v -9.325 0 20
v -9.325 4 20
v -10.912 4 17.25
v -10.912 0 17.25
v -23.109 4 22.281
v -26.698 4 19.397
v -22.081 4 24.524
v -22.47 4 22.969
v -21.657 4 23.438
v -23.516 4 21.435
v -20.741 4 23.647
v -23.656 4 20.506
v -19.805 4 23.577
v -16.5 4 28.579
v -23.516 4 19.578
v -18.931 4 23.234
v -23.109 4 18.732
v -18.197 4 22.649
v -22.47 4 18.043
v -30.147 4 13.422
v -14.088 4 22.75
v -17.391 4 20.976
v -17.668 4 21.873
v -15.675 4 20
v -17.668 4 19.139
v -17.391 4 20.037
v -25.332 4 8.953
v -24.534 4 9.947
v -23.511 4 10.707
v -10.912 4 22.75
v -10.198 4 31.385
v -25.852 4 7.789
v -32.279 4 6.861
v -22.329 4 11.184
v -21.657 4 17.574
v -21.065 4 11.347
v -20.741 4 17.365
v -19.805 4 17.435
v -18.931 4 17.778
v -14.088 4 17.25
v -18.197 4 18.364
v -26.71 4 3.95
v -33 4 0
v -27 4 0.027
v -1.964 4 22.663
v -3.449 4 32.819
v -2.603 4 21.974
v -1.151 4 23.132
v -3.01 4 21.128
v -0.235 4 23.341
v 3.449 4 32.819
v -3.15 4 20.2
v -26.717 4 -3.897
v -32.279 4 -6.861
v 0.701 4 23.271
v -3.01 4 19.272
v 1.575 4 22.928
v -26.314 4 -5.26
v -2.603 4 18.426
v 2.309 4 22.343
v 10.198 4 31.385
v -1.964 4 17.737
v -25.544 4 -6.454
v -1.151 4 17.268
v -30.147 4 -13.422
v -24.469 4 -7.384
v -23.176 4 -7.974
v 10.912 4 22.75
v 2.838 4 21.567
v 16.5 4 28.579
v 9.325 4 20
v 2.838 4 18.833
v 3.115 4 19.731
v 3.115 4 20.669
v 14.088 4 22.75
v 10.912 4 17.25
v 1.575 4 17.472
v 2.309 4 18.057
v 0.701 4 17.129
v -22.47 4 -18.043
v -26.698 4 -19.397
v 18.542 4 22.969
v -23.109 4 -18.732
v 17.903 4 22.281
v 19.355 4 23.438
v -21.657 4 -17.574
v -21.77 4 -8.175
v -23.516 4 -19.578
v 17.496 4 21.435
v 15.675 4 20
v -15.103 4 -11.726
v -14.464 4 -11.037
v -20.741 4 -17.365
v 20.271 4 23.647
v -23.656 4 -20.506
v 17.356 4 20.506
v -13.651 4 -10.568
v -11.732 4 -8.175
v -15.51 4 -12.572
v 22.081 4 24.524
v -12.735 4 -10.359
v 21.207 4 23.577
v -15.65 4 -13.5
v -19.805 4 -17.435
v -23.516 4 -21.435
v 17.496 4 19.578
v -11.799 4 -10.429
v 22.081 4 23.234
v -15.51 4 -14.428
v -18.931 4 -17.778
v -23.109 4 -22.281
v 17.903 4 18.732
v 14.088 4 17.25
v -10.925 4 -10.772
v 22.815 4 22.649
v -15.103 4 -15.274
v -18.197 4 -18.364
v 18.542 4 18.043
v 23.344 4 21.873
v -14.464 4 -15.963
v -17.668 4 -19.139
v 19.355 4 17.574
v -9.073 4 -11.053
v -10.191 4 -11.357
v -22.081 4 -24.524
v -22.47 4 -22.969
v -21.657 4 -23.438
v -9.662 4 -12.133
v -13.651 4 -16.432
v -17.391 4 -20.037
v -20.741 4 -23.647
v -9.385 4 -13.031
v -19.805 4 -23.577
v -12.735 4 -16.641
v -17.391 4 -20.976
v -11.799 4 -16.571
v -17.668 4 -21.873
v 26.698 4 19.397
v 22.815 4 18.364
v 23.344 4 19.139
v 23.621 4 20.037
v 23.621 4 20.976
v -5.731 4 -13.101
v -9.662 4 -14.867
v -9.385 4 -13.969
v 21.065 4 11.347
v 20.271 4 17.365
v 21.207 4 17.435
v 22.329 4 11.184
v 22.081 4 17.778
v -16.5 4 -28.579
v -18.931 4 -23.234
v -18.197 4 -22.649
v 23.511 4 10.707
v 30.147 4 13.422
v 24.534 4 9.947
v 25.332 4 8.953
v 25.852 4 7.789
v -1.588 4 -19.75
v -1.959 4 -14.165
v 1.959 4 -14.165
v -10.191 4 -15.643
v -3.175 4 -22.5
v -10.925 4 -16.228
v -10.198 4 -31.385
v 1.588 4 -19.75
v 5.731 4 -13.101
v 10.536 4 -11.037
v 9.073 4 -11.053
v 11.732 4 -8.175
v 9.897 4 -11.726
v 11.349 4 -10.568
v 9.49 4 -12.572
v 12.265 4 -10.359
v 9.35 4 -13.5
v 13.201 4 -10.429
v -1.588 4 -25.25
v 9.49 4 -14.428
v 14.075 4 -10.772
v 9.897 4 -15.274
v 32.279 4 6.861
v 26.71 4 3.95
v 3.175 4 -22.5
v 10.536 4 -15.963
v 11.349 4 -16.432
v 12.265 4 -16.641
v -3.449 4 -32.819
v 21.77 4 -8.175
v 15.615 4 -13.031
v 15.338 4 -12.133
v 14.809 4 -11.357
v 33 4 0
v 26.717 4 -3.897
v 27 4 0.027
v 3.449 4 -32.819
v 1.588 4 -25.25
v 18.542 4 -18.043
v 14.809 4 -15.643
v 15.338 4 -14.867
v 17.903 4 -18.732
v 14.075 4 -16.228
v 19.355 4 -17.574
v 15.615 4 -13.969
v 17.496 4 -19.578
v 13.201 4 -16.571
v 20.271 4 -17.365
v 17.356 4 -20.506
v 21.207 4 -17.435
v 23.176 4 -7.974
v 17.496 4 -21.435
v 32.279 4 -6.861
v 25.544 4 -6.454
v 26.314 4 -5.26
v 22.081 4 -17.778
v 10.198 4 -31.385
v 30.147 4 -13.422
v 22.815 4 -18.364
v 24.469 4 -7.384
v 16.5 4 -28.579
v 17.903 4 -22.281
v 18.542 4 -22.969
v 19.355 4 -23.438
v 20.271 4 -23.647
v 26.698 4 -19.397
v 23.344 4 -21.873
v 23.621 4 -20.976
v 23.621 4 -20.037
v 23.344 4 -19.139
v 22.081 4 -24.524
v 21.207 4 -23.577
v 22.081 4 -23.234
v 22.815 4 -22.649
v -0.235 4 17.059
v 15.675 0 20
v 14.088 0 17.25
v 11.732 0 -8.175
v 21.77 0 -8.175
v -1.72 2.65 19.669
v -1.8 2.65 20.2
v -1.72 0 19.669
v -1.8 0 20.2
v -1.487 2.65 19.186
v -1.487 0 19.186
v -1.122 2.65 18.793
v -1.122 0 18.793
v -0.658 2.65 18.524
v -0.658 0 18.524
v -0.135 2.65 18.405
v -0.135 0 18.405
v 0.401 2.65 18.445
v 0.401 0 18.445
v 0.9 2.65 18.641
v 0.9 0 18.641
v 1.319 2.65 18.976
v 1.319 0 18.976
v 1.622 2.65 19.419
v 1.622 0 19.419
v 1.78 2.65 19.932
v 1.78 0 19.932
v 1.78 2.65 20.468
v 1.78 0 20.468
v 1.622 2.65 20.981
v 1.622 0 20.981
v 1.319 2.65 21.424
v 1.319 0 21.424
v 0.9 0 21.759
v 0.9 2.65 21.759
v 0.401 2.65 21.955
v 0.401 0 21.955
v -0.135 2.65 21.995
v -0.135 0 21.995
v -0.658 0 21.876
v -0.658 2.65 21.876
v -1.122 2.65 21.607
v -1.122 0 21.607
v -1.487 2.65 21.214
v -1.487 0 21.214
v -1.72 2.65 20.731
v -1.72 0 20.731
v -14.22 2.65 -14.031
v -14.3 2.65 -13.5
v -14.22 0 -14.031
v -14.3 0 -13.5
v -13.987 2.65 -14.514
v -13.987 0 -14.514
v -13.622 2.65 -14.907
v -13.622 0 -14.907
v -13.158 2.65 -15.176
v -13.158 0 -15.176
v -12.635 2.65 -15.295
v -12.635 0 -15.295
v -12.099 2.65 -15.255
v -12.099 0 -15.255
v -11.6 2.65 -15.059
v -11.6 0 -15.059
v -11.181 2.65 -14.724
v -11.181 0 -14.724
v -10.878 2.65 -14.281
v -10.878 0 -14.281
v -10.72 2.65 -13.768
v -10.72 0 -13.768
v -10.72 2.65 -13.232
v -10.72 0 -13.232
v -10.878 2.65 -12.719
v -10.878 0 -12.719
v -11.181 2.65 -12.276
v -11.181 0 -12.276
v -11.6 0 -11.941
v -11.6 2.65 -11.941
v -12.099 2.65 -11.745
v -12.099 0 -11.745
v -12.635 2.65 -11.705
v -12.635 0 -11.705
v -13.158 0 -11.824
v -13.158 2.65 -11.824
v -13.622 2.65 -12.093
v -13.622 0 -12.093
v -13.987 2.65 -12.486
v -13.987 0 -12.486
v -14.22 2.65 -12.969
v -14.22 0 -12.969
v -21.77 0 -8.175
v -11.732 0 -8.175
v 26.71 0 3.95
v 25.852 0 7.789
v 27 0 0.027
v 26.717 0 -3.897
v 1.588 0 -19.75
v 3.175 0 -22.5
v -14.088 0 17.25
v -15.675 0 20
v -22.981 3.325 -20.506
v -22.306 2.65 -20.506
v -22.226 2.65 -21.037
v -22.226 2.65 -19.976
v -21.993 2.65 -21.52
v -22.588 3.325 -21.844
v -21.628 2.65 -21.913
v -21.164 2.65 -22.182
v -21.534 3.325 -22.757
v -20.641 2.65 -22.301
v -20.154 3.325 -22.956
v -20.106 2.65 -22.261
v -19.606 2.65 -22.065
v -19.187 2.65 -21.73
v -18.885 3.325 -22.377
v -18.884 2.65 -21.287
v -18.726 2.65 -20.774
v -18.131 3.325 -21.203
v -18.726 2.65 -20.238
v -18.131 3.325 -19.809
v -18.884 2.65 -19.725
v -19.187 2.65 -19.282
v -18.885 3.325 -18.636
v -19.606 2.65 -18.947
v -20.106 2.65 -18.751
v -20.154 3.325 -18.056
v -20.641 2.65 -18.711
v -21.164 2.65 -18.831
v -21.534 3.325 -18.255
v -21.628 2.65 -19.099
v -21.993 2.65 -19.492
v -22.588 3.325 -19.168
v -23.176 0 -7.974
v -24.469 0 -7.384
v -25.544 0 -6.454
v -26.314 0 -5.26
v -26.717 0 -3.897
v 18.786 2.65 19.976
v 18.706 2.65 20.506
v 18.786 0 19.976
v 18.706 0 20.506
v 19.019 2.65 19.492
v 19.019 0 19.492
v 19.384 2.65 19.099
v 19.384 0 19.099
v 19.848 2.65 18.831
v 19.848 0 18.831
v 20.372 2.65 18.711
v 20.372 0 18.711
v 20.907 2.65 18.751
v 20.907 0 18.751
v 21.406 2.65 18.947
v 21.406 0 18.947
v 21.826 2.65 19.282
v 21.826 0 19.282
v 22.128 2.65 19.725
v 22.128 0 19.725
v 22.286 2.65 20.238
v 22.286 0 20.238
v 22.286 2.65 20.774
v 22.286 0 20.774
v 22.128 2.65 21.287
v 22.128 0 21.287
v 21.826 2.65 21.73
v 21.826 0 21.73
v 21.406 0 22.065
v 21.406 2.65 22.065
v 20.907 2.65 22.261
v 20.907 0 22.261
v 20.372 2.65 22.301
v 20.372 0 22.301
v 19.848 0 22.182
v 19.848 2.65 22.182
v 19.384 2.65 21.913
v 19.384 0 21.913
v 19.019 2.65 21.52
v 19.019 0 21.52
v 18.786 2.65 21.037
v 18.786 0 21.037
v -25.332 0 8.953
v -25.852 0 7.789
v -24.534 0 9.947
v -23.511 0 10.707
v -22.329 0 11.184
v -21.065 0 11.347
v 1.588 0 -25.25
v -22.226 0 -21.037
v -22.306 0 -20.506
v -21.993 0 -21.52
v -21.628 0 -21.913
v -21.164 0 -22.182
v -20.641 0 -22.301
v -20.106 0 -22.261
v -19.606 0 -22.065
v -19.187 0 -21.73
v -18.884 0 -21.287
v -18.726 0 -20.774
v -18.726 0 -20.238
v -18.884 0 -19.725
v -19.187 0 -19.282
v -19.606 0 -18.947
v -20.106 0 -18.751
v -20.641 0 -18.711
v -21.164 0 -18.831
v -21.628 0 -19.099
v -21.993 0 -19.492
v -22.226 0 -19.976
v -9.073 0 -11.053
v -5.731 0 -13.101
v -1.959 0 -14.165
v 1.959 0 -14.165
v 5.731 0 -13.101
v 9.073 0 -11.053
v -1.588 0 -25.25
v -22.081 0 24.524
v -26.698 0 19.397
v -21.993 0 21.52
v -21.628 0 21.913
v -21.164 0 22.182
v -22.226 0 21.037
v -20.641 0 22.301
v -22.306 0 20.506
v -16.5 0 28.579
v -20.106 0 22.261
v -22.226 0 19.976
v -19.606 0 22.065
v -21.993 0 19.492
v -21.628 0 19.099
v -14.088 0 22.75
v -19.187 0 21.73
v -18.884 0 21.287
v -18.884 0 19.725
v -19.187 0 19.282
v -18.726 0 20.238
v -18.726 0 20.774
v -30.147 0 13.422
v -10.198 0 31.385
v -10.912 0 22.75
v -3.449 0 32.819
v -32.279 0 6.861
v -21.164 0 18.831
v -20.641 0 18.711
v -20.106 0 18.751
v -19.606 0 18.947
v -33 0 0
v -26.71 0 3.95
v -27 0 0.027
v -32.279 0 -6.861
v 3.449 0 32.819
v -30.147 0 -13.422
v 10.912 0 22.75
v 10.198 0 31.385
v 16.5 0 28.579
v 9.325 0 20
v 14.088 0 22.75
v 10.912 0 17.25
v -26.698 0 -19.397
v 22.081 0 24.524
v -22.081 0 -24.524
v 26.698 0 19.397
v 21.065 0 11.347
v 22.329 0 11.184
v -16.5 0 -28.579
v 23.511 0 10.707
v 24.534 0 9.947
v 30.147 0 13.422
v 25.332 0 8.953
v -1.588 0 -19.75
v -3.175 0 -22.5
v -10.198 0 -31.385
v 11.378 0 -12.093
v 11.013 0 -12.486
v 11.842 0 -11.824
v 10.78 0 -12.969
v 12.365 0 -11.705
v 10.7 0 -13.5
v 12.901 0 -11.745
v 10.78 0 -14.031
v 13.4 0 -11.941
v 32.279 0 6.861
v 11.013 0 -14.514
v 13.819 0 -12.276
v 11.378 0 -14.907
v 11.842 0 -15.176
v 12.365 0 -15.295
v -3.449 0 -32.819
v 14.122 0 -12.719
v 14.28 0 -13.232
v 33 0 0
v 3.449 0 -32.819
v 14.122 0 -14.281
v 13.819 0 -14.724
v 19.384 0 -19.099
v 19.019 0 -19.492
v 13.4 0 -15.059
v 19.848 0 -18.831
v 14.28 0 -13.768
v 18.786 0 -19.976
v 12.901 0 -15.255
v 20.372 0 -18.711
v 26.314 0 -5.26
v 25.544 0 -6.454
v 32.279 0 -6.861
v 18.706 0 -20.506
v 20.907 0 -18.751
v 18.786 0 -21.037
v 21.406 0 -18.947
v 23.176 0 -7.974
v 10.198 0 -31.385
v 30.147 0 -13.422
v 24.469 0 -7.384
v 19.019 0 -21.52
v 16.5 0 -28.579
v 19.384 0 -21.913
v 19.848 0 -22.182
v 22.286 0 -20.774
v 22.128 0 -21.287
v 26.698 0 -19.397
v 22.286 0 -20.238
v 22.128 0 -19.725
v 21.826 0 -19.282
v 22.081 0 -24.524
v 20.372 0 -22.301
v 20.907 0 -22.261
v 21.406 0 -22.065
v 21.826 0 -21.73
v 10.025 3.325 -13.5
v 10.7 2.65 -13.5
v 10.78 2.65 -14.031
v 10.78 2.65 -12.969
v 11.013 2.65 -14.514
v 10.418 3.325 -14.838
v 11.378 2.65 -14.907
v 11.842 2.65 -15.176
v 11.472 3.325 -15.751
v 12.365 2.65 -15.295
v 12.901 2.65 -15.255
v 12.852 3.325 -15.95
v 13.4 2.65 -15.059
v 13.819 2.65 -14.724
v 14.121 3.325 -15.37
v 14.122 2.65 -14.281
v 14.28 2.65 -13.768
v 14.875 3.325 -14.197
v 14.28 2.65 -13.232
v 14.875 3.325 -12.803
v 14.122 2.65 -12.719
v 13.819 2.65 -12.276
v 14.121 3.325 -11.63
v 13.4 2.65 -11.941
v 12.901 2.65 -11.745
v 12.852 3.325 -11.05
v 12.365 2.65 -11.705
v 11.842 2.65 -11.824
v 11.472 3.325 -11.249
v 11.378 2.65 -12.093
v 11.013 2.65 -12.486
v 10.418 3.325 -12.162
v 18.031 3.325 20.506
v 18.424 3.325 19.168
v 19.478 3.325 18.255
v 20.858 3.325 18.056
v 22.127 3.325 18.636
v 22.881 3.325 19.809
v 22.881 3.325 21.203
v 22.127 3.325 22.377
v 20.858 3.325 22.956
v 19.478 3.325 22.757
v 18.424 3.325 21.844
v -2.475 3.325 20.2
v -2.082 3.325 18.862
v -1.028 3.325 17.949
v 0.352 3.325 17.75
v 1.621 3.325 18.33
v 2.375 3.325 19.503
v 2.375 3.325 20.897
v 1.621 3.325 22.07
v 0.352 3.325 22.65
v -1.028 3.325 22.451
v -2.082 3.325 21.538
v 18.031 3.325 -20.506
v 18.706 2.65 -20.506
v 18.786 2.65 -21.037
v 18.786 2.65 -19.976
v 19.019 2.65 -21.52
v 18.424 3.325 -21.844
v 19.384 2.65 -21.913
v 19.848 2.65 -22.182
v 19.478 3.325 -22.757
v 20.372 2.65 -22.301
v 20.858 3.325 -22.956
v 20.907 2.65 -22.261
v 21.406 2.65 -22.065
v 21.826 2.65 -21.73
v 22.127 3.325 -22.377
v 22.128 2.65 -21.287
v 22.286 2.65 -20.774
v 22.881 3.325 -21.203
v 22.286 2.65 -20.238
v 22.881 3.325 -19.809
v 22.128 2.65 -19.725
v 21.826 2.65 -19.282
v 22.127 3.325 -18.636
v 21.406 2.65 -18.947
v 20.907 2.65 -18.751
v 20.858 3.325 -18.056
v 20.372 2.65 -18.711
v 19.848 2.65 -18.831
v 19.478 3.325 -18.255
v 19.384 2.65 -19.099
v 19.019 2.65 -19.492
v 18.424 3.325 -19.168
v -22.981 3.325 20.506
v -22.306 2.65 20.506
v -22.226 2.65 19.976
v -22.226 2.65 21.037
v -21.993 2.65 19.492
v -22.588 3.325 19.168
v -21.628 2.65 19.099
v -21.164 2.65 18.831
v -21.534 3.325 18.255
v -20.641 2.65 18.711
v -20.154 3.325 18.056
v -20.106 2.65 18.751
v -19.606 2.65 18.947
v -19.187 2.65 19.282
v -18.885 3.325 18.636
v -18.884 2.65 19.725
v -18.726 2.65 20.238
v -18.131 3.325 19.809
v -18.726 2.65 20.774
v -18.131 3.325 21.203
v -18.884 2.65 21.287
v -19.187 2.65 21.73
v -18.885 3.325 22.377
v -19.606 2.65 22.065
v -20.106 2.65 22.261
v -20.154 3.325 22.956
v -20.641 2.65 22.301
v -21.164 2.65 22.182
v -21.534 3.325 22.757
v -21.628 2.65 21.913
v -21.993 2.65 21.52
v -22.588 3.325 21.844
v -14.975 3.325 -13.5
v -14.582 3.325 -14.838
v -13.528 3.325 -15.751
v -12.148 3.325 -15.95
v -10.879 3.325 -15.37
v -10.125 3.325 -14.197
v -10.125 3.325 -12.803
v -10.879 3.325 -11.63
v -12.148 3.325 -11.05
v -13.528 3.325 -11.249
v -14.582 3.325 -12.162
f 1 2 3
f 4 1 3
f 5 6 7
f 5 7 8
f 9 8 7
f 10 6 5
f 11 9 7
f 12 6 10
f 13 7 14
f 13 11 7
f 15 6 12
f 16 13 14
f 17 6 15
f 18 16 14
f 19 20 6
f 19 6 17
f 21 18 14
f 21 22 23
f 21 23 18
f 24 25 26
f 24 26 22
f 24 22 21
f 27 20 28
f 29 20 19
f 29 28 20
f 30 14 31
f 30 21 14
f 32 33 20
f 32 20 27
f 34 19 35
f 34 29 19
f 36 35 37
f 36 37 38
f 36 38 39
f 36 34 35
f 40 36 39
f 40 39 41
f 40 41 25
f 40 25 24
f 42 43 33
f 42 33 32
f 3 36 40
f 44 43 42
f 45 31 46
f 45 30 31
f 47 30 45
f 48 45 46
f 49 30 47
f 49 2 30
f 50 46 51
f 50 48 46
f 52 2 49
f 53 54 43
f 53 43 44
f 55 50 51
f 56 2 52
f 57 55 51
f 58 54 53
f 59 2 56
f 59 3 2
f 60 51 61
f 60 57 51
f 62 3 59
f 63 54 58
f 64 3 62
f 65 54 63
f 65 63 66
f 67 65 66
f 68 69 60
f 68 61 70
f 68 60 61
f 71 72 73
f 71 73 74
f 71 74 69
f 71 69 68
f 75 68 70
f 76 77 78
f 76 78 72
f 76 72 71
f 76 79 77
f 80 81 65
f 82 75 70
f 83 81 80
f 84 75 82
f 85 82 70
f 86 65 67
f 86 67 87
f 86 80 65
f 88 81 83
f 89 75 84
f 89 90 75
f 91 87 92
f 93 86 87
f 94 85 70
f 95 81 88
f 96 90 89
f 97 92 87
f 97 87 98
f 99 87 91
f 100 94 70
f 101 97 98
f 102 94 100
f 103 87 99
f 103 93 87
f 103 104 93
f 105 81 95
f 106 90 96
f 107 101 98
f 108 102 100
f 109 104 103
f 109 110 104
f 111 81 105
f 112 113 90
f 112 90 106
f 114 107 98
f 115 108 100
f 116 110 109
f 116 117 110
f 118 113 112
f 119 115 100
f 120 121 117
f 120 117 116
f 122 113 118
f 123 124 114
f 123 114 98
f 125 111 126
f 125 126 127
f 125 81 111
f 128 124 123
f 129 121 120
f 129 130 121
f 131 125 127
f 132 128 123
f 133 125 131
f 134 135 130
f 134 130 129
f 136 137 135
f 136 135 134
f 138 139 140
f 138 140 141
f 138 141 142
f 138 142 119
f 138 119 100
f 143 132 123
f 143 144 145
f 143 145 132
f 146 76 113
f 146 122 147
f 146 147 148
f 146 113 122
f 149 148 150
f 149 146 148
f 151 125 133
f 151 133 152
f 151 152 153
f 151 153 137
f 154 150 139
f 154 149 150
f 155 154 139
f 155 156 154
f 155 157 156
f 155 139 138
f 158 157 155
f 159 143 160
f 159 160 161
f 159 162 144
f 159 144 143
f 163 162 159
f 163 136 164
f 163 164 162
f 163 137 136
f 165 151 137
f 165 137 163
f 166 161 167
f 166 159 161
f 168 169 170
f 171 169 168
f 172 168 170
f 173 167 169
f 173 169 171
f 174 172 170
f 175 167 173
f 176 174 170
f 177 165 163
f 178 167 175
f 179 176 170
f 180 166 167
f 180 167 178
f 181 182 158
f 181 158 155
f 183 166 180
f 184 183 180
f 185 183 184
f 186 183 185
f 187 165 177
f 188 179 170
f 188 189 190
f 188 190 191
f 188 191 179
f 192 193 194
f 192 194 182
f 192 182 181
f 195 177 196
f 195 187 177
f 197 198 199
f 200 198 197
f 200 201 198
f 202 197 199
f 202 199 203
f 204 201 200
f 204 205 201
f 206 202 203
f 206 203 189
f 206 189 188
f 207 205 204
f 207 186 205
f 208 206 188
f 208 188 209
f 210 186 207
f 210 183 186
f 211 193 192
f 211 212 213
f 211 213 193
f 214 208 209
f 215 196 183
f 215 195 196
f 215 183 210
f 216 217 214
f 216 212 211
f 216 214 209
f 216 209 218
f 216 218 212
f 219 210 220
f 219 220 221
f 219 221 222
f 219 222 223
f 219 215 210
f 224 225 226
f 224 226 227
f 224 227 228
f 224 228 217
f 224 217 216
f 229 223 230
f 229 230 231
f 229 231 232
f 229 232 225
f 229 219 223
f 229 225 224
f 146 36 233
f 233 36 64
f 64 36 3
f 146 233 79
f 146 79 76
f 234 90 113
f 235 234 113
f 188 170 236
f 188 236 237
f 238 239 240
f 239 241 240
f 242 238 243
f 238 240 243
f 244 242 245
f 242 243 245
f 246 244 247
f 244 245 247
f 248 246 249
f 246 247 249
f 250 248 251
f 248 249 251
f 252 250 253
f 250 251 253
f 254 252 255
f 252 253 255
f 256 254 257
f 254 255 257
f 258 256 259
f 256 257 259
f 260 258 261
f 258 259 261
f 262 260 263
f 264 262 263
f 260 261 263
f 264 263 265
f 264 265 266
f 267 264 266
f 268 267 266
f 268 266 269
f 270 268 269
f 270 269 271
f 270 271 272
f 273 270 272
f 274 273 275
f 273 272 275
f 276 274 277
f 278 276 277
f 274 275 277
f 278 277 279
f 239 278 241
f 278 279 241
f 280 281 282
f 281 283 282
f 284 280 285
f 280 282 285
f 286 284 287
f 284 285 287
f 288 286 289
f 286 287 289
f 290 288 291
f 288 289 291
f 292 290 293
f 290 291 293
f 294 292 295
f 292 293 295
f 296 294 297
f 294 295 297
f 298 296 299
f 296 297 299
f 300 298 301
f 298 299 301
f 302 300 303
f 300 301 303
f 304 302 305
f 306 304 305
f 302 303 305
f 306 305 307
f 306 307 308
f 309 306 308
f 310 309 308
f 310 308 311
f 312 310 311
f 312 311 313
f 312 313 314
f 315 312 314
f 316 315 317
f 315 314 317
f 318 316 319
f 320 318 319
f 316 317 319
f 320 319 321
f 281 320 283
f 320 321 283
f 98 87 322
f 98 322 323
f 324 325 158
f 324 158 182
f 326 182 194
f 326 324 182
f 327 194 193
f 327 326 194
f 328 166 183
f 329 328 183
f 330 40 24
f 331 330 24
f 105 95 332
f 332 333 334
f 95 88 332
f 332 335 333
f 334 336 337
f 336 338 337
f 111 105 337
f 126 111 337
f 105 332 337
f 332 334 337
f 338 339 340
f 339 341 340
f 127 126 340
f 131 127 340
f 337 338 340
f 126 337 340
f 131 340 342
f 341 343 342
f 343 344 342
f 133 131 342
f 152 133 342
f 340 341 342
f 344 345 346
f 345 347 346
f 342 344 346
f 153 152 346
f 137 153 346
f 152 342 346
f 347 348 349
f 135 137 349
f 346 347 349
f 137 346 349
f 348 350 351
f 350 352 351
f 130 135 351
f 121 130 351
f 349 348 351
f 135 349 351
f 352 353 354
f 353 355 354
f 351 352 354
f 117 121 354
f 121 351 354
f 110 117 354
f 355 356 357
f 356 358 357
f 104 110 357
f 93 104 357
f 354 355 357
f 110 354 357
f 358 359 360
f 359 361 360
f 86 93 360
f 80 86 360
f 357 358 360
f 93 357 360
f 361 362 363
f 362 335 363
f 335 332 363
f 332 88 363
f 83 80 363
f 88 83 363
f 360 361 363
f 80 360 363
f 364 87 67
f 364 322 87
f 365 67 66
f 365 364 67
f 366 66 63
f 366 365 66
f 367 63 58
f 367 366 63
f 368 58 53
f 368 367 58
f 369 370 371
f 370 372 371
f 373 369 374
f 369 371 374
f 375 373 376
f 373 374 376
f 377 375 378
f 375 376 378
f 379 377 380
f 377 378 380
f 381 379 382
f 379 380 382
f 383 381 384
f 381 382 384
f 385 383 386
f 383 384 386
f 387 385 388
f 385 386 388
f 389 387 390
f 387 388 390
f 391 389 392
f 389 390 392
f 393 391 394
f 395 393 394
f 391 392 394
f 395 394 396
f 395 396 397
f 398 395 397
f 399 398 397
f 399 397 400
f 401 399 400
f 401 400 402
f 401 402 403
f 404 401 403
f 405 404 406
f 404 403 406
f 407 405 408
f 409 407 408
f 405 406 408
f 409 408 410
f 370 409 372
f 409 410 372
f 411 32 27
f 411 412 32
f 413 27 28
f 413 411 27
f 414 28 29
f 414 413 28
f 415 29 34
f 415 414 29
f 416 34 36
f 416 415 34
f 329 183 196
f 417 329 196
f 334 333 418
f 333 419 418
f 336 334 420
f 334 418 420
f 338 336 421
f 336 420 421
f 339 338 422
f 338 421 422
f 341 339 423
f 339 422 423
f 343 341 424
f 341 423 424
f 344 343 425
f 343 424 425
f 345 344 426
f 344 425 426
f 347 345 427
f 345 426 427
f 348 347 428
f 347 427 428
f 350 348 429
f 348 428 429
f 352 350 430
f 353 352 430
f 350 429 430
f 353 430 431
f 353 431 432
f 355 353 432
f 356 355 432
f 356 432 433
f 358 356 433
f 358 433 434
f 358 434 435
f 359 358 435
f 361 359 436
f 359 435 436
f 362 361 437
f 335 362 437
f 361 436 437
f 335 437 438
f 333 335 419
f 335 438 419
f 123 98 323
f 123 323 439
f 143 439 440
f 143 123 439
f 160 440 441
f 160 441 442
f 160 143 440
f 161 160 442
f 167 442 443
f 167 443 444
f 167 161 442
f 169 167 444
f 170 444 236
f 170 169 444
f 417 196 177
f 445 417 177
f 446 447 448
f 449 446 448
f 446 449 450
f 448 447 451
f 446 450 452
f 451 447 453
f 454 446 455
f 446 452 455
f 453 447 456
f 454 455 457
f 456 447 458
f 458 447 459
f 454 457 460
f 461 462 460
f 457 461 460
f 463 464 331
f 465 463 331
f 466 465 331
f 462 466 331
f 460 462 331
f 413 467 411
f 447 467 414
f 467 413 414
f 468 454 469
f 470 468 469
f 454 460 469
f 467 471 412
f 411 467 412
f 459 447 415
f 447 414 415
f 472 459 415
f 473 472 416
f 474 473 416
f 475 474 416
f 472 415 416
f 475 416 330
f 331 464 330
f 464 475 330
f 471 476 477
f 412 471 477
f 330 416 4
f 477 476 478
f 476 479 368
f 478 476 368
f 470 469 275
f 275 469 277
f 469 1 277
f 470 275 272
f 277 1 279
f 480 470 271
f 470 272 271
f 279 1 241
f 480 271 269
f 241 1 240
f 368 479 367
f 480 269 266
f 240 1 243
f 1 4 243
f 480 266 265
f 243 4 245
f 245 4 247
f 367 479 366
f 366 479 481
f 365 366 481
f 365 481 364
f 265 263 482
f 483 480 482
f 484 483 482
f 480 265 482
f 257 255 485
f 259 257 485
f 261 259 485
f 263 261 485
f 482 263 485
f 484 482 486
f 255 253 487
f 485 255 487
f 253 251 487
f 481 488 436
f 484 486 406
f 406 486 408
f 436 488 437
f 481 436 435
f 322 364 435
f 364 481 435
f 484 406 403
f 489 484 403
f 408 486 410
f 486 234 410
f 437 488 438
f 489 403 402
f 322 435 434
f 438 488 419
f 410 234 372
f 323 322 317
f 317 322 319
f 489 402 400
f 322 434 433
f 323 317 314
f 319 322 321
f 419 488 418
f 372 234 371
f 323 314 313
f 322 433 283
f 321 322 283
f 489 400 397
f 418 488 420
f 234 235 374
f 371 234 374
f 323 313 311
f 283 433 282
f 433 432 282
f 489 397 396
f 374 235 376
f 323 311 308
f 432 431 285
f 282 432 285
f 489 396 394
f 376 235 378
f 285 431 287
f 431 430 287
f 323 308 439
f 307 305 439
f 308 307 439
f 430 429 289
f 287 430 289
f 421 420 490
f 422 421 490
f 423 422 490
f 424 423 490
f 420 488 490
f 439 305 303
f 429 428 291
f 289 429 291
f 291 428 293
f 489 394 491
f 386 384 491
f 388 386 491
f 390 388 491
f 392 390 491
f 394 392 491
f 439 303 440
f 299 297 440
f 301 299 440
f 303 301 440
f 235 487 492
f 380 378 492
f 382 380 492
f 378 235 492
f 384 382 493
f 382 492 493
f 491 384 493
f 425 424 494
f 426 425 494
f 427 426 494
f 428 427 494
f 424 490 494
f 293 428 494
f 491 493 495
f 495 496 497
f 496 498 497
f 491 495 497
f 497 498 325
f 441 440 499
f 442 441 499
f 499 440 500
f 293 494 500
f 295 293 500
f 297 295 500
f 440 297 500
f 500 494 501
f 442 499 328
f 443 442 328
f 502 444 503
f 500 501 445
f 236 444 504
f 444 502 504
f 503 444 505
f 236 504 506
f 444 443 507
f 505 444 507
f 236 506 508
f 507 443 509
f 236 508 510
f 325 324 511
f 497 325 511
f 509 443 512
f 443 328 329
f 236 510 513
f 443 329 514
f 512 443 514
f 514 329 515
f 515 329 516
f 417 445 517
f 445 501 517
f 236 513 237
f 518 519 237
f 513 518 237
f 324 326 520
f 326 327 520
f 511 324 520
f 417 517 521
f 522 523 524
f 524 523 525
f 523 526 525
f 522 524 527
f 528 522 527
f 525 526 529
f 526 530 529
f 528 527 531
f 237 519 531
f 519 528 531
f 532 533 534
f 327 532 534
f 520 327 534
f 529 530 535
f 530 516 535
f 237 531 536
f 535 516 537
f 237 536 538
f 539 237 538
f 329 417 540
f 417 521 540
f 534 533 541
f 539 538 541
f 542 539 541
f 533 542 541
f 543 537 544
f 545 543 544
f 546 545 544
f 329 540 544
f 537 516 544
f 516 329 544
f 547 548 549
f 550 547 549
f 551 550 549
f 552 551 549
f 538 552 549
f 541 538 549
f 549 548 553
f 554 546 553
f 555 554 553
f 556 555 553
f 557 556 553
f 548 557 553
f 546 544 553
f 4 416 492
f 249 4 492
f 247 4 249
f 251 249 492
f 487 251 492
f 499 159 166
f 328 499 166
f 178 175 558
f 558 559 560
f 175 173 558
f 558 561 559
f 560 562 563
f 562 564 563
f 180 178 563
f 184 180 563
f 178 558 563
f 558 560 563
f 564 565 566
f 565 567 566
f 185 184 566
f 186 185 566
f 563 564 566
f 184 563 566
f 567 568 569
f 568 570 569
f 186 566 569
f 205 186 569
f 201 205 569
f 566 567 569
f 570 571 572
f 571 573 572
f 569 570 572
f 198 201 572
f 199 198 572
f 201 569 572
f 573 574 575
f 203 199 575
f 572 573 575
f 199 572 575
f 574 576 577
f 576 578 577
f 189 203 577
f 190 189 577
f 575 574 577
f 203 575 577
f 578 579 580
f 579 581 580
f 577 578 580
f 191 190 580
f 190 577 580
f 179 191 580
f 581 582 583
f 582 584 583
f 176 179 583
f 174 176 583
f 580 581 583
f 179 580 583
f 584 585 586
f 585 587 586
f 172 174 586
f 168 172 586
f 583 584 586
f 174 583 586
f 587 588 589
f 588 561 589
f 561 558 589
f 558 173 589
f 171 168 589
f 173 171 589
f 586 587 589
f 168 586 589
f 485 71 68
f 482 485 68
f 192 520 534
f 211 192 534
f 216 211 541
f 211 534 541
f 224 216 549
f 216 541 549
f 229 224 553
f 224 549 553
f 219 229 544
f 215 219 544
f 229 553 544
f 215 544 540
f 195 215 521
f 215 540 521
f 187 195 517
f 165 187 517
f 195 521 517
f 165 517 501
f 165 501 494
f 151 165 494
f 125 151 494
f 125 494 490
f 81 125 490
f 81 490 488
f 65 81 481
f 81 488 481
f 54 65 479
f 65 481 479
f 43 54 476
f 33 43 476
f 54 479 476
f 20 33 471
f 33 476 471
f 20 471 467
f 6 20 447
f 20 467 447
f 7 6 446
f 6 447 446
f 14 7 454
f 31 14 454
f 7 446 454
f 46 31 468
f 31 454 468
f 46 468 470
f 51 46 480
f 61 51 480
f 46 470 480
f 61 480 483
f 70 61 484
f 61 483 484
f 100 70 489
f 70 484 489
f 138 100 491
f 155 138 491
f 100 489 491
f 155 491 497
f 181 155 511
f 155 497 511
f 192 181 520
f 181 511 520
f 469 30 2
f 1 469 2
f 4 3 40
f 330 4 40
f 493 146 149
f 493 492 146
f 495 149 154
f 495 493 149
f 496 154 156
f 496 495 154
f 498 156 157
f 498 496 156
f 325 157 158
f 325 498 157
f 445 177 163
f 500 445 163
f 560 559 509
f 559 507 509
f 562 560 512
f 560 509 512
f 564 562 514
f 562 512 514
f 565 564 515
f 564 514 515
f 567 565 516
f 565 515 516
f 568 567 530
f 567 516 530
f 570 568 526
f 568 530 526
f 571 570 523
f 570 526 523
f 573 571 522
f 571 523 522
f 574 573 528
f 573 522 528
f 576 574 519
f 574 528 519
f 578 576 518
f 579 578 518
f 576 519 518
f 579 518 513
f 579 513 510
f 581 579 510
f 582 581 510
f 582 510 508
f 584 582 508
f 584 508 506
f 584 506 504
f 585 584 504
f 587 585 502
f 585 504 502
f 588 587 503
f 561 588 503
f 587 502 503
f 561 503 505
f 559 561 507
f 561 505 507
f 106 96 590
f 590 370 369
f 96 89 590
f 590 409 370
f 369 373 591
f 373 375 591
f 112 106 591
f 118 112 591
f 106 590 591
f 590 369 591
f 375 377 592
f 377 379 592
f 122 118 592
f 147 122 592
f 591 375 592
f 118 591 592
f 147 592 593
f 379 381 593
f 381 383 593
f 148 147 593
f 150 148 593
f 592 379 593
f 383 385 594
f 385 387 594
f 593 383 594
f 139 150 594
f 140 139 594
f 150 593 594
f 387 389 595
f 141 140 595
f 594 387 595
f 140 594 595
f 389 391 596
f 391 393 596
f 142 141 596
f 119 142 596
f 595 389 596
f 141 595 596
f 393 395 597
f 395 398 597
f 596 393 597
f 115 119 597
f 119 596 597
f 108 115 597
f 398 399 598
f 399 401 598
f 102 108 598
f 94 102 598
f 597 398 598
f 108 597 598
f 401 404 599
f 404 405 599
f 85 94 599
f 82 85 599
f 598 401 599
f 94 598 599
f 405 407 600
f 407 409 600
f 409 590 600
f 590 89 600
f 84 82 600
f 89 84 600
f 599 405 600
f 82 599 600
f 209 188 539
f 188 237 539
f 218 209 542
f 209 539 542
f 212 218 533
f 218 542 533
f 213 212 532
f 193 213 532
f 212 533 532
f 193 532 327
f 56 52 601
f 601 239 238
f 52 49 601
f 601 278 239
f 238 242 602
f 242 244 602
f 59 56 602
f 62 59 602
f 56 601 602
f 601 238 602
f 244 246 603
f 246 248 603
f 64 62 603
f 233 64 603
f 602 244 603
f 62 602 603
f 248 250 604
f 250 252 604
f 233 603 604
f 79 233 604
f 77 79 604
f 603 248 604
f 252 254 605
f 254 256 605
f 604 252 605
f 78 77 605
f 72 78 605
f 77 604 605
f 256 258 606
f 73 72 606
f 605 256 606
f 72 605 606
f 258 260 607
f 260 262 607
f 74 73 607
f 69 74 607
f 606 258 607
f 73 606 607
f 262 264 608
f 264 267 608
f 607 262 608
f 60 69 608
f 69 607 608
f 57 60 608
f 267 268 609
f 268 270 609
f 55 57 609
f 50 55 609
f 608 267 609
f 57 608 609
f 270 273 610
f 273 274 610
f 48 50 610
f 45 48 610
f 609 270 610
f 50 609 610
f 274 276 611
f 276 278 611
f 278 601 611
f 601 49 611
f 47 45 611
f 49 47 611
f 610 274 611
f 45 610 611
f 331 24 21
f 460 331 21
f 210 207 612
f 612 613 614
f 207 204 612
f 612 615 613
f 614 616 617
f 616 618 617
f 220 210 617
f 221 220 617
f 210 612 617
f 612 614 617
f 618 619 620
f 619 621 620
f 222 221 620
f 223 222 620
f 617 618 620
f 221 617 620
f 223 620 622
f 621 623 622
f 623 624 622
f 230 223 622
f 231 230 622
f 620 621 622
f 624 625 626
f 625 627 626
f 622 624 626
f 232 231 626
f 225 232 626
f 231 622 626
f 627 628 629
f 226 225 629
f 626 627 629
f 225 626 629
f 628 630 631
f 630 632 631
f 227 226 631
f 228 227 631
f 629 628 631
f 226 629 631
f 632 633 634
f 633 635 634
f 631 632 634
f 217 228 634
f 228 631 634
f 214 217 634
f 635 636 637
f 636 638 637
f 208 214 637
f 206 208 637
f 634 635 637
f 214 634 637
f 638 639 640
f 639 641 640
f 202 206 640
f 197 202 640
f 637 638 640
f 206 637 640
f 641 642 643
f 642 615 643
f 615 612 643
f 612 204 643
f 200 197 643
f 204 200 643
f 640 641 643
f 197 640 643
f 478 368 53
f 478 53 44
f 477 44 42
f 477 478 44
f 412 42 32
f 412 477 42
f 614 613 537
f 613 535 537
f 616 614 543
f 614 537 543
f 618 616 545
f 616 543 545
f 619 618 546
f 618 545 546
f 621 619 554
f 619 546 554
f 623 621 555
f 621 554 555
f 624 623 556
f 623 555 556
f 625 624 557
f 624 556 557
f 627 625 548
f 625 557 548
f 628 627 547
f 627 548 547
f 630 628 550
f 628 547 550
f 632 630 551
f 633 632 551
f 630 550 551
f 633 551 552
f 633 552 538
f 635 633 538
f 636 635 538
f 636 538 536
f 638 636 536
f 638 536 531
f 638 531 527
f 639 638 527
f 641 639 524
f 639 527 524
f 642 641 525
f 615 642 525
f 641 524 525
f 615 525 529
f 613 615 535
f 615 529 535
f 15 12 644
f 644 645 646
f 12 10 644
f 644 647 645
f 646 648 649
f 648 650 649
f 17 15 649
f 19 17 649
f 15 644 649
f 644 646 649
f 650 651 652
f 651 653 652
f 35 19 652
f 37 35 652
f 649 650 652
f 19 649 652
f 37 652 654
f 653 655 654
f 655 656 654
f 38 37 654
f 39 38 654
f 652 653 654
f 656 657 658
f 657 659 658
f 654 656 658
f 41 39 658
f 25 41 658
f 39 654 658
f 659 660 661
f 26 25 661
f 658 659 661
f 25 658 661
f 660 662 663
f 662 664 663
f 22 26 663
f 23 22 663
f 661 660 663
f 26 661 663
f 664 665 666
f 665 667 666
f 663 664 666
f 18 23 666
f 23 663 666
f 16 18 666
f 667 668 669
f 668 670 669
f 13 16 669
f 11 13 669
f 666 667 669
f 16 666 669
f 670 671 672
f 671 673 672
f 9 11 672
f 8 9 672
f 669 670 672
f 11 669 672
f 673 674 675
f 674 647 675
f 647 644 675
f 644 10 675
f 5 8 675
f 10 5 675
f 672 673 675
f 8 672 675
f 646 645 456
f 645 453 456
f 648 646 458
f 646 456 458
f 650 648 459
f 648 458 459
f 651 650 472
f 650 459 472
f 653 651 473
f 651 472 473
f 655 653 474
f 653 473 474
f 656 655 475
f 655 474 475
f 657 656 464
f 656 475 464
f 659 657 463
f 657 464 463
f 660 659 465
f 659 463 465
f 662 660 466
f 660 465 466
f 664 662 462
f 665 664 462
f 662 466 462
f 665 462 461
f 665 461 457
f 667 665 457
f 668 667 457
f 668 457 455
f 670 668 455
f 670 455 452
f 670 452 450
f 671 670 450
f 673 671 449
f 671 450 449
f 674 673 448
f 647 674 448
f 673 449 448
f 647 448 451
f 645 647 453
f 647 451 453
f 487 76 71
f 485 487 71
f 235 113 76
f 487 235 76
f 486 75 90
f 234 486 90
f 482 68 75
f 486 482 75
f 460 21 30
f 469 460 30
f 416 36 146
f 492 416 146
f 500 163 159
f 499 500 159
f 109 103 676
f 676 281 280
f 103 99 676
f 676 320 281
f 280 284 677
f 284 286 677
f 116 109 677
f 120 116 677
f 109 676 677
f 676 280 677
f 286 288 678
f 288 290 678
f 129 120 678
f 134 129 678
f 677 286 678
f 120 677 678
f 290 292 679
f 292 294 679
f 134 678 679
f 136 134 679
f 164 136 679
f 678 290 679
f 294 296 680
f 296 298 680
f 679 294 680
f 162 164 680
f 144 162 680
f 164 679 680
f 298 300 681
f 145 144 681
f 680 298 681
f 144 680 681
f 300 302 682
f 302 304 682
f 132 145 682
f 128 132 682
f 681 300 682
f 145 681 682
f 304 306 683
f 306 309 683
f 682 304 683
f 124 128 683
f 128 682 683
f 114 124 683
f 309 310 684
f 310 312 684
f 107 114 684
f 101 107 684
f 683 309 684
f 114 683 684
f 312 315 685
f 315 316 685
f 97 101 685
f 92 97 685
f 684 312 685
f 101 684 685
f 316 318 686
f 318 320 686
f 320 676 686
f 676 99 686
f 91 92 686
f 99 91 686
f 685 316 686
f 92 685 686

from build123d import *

# Parameters (mm, degrees)
SKETCH1_R                                       = 33
SKETCH1_R_2                                     = 27
BOSS_EXTRUDE1_DEPTH                             = 4
SKETCH2_R                                       = 1.5
SALIENTE_EXTRUIR1_DEPTH                         = 4
CORTAR_EXTRUIR1_REACH                           = 6
CROQUIS1_R                                      = 1.75
CSK_FOR_M3_FLAT_HEAD_MACHINE_SCREW1_D           = 3.6
CSK_FOR_M3_FLAT_HEAD_MACHINE_SCREW1_CSINK_D     = 6.3
CSK_FOR_M3_FLAT_HEAD_MACHINE_SCREW1_CSINK_ANGLE = 90
CSK_FOR_M3_FLAT_HEAD_MACHINE_SCREW2_D           = 3.6
CSK_FOR_M3_FLAT_HEAD_MACHINE_SCREW2_CSINK_D     = 6.3
CSK_FOR_M3_FLAT_HEAD_MACHINE_SCREW2_CSINK_ANGLE = 90
FILLET1_R                                       = 5


with BuildPart() as part:
    # Sketch1 → Boss-Extrude1 (new body)
    with BuildSketch(Plane(origin=(0, 0, 0), x_dir=(1, 0, 0), z_dir=(0, 1, 0))):
        Circle(SKETCH1_R)
        Circle(SKETCH1_R_2, mode=Mode.SUBTRACT)
    extrude(amount=BOSS_EXTRUDE1_DEPTH)

    # Sketch2 → Saliente-Extruir1 (add)
    with BuildSketch(Plane(origin=(0, 4, 0), x_dir=(1, 0, 0), z_dir=(0, 1, 0))):
        with BuildLine():
            Line((-24.5, -11.346805718), (24.5, -11.346805718))
            ThreePointArc((24.5, -11.346805718), (0, -27), (-24.5, -11.346805718))
        make_face()
        with Locations((0, -20.2)):
            Circle(SKETCH2_R, mode=Mode.SUBTRACT)
        with BuildLine():
            Line((-25.7325, 8.175478197), (-11.7325, 8.175478197))
            ThreePointArc((-11.7325, 8.175478197), (0, 14.3), (11.7325, 8.175478197))
            Line((11.7325, 8.175478197), (25.7325, 8.175478197))
            ThreePointArc((25.7325, 8.175478197), (0, 27), (-25.7325, 8.175478197))
        make_face()
        with Locations((-12.5, 13.5)):
            Circle(SKETCH2_R, mode=Mode.SUBTRACT)
        with Locations((12.5, 13.5)):
            Circle(SKETCH2_R, mode=Mode.SUBTRACT)
    extrude(amount=-SALIENTE_EXTRUIR1_DEPTH)

    # Croquis1 → Cortar-Extruir1 (cut, up to next)
    with BuildSketch(Plane(origin=(0, 4, 0), x_dir=(1, 0, 0), z_dir=(0, 1, 0)), mode=Mode.PRIVATE) as cortar_extruir1_sk1:
        with Locations((-20.506096654, 20.506096654)):
            Circle(CROQUIS1_R)
    cortar_extruir1_tool1 = extrude(cortar_extruir1_sk1.sketch, amount=-CORTAR_EXTRUIR1_REACH, mode=Mode.PRIVATE) & part.part
    add(cortar_extruir1_tool1.solids().sort_by_distance((-20.506097, 4, -20.506097))[0], mode=Mode.SUBTRACT)
    # Croquis1 → Cortar-Extruir1 (cut, up to next)
    with BuildSketch(Plane(origin=(0, 4, 0), x_dir=(1, 0, 0), z_dir=(0, 1, 0)), mode=Mode.PRIVATE) as cortar_extruir1_sk2:
        with Locations((20.506096654, 20.506096654)):
            Circle(CROQUIS1_R)
    cortar_extruir1_tool2 = extrude(cortar_extruir1_sk2.sketch, amount=-CORTAR_EXTRUIR1_REACH, mode=Mode.PRIVATE) & part.part
    add(cortar_extruir1_tool2.solids().sort_by_distance((20.506097, 4, -20.506097))[0], mode=Mode.SUBTRACT)
    # Croquis1 → Cortar-Extruir1 (cut, up to next)
    with BuildSketch(Plane(origin=(0, 4, 0), x_dir=(1, 0, 0), z_dir=(0, 1, 0)), mode=Mode.PRIVATE) as cortar_extruir1_sk3:
        with Locations((-20.506096654, -20.506096654)):
            Circle(CROQUIS1_R)
    cortar_extruir1_tool3 = extrude(cortar_extruir1_sk3.sketch, amount=-CORTAR_EXTRUIR1_REACH, mode=Mode.PRIVATE) & part.part
    add(cortar_extruir1_tool3.solids().sort_by_distance((-20.506097, 4, 20.506097))[0], mode=Mode.SUBTRACT)
    # Croquis1 → Cortar-Extruir1 (cut, up to next)
    with BuildSketch(Plane(origin=(0, 4, 0), x_dir=(1, 0, 0), z_dir=(0, 1, 0)), mode=Mode.PRIVATE) as cortar_extruir1_sk4:
        with Locations((20.506096654, -20.506096654)):
            Circle(CROQUIS1_R)
    cortar_extruir1_tool4 = extrude(cortar_extruir1_sk4.sketch, amount=-CORTAR_EXTRUIR1_REACH, mode=Mode.PRIVATE) & part.part
    add(cortar_extruir1_tool4.solids().sort_by_distance((20.506097, 4, 20.506097))[0], mode=Mode.SUBTRACT)
    # Croquis1 → Cortar-Extruir1 (cut, up to next)
    with BuildSketch(Plane(origin=(0, 4, 0), x_dir=(1, 0, 0), z_dir=(0, 1, 0)), mode=Mode.PRIVATE) as cortar_extruir1_sk5:
        Polygon((-9.324573519, -20), (-10.91228676, -17.25), (-14.08771324, -17.25), (-15.675426481, -20), (-14.08771324, -22.75), (-10.91228676, -22.75), align=None)
    cortar_extruir1_tool5 = extrude(cortar_extruir1_sk5.sketch, amount=-CORTAR_EXTRUIR1_REACH, mode=Mode.PRIVATE) & part.part
    add(cortar_extruir1_tool5.solids().sort_by_distance((-12.5, 4, 20))[0], mode=Mode.SUBTRACT)
    # Croquis1 → Cortar-Extruir1 (cut, up to next)
    with BuildSketch(Plane(origin=(0, 4, 0), x_dir=(1, 0, 0), z_dir=(0, 1, 0)), mode=Mode.PRIVATE) as cortar_extruir1_sk6:
        Polygon((15.675426481, -20), (14.08771324, -17.25), (10.91228676, -17.25), (9.324573519, -20), (10.91228676, -22.75), (14.08771324, -22.75), align=None)
    cortar_extruir1_tool6 = extrude(cortar_extruir1_sk6.sketch, amount=-CORTAR_EXTRUIR1_REACH, mode=Mode.PRIVATE) & part.part
    add(cortar_extruir1_tool6.solids().sort_by_distance((12.5, 4, 20))[0], mode=Mode.SUBTRACT)
    # Croquis1 → Cortar-Extruir1 (cut, up to next)
    with BuildSketch(Plane(origin=(0, 4, 0), x_dir=(1, 0, 0), z_dir=(0, 1, 0)), mode=Mode.PRIVATE) as cortar_extruir1_sk7:
        Polygon((3.175426481, 22.5), (1.58771324, 25.25), (-1.58771324, 25.25), (-3.175426481, 22.5), (-1.58771324, 19.75), (1.58771324, 19.75), align=None)
    cortar_extruir1_tool7 = extrude(cortar_extruir1_sk7.sketch, amount=-CORTAR_EXTRUIR1_REACH, mode=Mode.PRIVATE) & part.part
    add(cortar_extruir1_tool7.solids().sort_by_distance((0, 4, -22.5))[0], mode=Mode.SUBTRACT)

    # CSK for M3 Flat Head Machine Screw1 (through all)
    with Locations(Plane(origin=(0, 4, 0), x_dir=(1, 0, 0), z_dir=(0, 1, 0))):
        with Locations((-20.506096654, 20.506096654), (20.506096654, 20.506096654), (20.506096654, -20.506096654), (-20.506096654, -20.506096654)):
            CounterSinkHole(CSK_FOR_M3_FLAT_HEAD_MACHINE_SCREW1_D / 2, CSK_FOR_M3_FLAT_HEAD_MACHINE_SCREW1_CSINK_D / 2, counter_sink_angle=CSK_FOR_M3_FLAT_HEAD_MACHINE_SCREW1_CSINK_ANGLE)

    # CSK for M3 Flat Head Machine Screw2 (through all)
    with Locations(Plane(origin=(0, 4, 0), x_dir=(1, 0, 0), z_dir=(0, 1, 0))):
        with Locations((-12.5, 13.5), (12.5, 13.5), (0, -20.2)):
            CounterSinkHole(CSK_FOR_M3_FLAT_HEAD_MACHINE_SCREW2_D / 2, CSK_FOR_M3_FLAT_HEAD_MACHINE_SCREW2_CSINK_D / 2, counter_sink_angle=CSK_FOR_M3_FLAT_HEAD_MACHINE_SCREW2_CSINK_ANGLE)

    # Fillet1
    fillet1_edges = [part.edges().sort_by_distance(p)[0] for p in [
        (-25.7325, 2, -8.175478197),
        (25.7325, 2, -8.175478197),
        (24.5, 2, 11.346805718),
        (-24.5, 2, 11.346805718),
    ]]
    fillet(fillet1_edges, radius=FILLET1_R)


solid = part.part
